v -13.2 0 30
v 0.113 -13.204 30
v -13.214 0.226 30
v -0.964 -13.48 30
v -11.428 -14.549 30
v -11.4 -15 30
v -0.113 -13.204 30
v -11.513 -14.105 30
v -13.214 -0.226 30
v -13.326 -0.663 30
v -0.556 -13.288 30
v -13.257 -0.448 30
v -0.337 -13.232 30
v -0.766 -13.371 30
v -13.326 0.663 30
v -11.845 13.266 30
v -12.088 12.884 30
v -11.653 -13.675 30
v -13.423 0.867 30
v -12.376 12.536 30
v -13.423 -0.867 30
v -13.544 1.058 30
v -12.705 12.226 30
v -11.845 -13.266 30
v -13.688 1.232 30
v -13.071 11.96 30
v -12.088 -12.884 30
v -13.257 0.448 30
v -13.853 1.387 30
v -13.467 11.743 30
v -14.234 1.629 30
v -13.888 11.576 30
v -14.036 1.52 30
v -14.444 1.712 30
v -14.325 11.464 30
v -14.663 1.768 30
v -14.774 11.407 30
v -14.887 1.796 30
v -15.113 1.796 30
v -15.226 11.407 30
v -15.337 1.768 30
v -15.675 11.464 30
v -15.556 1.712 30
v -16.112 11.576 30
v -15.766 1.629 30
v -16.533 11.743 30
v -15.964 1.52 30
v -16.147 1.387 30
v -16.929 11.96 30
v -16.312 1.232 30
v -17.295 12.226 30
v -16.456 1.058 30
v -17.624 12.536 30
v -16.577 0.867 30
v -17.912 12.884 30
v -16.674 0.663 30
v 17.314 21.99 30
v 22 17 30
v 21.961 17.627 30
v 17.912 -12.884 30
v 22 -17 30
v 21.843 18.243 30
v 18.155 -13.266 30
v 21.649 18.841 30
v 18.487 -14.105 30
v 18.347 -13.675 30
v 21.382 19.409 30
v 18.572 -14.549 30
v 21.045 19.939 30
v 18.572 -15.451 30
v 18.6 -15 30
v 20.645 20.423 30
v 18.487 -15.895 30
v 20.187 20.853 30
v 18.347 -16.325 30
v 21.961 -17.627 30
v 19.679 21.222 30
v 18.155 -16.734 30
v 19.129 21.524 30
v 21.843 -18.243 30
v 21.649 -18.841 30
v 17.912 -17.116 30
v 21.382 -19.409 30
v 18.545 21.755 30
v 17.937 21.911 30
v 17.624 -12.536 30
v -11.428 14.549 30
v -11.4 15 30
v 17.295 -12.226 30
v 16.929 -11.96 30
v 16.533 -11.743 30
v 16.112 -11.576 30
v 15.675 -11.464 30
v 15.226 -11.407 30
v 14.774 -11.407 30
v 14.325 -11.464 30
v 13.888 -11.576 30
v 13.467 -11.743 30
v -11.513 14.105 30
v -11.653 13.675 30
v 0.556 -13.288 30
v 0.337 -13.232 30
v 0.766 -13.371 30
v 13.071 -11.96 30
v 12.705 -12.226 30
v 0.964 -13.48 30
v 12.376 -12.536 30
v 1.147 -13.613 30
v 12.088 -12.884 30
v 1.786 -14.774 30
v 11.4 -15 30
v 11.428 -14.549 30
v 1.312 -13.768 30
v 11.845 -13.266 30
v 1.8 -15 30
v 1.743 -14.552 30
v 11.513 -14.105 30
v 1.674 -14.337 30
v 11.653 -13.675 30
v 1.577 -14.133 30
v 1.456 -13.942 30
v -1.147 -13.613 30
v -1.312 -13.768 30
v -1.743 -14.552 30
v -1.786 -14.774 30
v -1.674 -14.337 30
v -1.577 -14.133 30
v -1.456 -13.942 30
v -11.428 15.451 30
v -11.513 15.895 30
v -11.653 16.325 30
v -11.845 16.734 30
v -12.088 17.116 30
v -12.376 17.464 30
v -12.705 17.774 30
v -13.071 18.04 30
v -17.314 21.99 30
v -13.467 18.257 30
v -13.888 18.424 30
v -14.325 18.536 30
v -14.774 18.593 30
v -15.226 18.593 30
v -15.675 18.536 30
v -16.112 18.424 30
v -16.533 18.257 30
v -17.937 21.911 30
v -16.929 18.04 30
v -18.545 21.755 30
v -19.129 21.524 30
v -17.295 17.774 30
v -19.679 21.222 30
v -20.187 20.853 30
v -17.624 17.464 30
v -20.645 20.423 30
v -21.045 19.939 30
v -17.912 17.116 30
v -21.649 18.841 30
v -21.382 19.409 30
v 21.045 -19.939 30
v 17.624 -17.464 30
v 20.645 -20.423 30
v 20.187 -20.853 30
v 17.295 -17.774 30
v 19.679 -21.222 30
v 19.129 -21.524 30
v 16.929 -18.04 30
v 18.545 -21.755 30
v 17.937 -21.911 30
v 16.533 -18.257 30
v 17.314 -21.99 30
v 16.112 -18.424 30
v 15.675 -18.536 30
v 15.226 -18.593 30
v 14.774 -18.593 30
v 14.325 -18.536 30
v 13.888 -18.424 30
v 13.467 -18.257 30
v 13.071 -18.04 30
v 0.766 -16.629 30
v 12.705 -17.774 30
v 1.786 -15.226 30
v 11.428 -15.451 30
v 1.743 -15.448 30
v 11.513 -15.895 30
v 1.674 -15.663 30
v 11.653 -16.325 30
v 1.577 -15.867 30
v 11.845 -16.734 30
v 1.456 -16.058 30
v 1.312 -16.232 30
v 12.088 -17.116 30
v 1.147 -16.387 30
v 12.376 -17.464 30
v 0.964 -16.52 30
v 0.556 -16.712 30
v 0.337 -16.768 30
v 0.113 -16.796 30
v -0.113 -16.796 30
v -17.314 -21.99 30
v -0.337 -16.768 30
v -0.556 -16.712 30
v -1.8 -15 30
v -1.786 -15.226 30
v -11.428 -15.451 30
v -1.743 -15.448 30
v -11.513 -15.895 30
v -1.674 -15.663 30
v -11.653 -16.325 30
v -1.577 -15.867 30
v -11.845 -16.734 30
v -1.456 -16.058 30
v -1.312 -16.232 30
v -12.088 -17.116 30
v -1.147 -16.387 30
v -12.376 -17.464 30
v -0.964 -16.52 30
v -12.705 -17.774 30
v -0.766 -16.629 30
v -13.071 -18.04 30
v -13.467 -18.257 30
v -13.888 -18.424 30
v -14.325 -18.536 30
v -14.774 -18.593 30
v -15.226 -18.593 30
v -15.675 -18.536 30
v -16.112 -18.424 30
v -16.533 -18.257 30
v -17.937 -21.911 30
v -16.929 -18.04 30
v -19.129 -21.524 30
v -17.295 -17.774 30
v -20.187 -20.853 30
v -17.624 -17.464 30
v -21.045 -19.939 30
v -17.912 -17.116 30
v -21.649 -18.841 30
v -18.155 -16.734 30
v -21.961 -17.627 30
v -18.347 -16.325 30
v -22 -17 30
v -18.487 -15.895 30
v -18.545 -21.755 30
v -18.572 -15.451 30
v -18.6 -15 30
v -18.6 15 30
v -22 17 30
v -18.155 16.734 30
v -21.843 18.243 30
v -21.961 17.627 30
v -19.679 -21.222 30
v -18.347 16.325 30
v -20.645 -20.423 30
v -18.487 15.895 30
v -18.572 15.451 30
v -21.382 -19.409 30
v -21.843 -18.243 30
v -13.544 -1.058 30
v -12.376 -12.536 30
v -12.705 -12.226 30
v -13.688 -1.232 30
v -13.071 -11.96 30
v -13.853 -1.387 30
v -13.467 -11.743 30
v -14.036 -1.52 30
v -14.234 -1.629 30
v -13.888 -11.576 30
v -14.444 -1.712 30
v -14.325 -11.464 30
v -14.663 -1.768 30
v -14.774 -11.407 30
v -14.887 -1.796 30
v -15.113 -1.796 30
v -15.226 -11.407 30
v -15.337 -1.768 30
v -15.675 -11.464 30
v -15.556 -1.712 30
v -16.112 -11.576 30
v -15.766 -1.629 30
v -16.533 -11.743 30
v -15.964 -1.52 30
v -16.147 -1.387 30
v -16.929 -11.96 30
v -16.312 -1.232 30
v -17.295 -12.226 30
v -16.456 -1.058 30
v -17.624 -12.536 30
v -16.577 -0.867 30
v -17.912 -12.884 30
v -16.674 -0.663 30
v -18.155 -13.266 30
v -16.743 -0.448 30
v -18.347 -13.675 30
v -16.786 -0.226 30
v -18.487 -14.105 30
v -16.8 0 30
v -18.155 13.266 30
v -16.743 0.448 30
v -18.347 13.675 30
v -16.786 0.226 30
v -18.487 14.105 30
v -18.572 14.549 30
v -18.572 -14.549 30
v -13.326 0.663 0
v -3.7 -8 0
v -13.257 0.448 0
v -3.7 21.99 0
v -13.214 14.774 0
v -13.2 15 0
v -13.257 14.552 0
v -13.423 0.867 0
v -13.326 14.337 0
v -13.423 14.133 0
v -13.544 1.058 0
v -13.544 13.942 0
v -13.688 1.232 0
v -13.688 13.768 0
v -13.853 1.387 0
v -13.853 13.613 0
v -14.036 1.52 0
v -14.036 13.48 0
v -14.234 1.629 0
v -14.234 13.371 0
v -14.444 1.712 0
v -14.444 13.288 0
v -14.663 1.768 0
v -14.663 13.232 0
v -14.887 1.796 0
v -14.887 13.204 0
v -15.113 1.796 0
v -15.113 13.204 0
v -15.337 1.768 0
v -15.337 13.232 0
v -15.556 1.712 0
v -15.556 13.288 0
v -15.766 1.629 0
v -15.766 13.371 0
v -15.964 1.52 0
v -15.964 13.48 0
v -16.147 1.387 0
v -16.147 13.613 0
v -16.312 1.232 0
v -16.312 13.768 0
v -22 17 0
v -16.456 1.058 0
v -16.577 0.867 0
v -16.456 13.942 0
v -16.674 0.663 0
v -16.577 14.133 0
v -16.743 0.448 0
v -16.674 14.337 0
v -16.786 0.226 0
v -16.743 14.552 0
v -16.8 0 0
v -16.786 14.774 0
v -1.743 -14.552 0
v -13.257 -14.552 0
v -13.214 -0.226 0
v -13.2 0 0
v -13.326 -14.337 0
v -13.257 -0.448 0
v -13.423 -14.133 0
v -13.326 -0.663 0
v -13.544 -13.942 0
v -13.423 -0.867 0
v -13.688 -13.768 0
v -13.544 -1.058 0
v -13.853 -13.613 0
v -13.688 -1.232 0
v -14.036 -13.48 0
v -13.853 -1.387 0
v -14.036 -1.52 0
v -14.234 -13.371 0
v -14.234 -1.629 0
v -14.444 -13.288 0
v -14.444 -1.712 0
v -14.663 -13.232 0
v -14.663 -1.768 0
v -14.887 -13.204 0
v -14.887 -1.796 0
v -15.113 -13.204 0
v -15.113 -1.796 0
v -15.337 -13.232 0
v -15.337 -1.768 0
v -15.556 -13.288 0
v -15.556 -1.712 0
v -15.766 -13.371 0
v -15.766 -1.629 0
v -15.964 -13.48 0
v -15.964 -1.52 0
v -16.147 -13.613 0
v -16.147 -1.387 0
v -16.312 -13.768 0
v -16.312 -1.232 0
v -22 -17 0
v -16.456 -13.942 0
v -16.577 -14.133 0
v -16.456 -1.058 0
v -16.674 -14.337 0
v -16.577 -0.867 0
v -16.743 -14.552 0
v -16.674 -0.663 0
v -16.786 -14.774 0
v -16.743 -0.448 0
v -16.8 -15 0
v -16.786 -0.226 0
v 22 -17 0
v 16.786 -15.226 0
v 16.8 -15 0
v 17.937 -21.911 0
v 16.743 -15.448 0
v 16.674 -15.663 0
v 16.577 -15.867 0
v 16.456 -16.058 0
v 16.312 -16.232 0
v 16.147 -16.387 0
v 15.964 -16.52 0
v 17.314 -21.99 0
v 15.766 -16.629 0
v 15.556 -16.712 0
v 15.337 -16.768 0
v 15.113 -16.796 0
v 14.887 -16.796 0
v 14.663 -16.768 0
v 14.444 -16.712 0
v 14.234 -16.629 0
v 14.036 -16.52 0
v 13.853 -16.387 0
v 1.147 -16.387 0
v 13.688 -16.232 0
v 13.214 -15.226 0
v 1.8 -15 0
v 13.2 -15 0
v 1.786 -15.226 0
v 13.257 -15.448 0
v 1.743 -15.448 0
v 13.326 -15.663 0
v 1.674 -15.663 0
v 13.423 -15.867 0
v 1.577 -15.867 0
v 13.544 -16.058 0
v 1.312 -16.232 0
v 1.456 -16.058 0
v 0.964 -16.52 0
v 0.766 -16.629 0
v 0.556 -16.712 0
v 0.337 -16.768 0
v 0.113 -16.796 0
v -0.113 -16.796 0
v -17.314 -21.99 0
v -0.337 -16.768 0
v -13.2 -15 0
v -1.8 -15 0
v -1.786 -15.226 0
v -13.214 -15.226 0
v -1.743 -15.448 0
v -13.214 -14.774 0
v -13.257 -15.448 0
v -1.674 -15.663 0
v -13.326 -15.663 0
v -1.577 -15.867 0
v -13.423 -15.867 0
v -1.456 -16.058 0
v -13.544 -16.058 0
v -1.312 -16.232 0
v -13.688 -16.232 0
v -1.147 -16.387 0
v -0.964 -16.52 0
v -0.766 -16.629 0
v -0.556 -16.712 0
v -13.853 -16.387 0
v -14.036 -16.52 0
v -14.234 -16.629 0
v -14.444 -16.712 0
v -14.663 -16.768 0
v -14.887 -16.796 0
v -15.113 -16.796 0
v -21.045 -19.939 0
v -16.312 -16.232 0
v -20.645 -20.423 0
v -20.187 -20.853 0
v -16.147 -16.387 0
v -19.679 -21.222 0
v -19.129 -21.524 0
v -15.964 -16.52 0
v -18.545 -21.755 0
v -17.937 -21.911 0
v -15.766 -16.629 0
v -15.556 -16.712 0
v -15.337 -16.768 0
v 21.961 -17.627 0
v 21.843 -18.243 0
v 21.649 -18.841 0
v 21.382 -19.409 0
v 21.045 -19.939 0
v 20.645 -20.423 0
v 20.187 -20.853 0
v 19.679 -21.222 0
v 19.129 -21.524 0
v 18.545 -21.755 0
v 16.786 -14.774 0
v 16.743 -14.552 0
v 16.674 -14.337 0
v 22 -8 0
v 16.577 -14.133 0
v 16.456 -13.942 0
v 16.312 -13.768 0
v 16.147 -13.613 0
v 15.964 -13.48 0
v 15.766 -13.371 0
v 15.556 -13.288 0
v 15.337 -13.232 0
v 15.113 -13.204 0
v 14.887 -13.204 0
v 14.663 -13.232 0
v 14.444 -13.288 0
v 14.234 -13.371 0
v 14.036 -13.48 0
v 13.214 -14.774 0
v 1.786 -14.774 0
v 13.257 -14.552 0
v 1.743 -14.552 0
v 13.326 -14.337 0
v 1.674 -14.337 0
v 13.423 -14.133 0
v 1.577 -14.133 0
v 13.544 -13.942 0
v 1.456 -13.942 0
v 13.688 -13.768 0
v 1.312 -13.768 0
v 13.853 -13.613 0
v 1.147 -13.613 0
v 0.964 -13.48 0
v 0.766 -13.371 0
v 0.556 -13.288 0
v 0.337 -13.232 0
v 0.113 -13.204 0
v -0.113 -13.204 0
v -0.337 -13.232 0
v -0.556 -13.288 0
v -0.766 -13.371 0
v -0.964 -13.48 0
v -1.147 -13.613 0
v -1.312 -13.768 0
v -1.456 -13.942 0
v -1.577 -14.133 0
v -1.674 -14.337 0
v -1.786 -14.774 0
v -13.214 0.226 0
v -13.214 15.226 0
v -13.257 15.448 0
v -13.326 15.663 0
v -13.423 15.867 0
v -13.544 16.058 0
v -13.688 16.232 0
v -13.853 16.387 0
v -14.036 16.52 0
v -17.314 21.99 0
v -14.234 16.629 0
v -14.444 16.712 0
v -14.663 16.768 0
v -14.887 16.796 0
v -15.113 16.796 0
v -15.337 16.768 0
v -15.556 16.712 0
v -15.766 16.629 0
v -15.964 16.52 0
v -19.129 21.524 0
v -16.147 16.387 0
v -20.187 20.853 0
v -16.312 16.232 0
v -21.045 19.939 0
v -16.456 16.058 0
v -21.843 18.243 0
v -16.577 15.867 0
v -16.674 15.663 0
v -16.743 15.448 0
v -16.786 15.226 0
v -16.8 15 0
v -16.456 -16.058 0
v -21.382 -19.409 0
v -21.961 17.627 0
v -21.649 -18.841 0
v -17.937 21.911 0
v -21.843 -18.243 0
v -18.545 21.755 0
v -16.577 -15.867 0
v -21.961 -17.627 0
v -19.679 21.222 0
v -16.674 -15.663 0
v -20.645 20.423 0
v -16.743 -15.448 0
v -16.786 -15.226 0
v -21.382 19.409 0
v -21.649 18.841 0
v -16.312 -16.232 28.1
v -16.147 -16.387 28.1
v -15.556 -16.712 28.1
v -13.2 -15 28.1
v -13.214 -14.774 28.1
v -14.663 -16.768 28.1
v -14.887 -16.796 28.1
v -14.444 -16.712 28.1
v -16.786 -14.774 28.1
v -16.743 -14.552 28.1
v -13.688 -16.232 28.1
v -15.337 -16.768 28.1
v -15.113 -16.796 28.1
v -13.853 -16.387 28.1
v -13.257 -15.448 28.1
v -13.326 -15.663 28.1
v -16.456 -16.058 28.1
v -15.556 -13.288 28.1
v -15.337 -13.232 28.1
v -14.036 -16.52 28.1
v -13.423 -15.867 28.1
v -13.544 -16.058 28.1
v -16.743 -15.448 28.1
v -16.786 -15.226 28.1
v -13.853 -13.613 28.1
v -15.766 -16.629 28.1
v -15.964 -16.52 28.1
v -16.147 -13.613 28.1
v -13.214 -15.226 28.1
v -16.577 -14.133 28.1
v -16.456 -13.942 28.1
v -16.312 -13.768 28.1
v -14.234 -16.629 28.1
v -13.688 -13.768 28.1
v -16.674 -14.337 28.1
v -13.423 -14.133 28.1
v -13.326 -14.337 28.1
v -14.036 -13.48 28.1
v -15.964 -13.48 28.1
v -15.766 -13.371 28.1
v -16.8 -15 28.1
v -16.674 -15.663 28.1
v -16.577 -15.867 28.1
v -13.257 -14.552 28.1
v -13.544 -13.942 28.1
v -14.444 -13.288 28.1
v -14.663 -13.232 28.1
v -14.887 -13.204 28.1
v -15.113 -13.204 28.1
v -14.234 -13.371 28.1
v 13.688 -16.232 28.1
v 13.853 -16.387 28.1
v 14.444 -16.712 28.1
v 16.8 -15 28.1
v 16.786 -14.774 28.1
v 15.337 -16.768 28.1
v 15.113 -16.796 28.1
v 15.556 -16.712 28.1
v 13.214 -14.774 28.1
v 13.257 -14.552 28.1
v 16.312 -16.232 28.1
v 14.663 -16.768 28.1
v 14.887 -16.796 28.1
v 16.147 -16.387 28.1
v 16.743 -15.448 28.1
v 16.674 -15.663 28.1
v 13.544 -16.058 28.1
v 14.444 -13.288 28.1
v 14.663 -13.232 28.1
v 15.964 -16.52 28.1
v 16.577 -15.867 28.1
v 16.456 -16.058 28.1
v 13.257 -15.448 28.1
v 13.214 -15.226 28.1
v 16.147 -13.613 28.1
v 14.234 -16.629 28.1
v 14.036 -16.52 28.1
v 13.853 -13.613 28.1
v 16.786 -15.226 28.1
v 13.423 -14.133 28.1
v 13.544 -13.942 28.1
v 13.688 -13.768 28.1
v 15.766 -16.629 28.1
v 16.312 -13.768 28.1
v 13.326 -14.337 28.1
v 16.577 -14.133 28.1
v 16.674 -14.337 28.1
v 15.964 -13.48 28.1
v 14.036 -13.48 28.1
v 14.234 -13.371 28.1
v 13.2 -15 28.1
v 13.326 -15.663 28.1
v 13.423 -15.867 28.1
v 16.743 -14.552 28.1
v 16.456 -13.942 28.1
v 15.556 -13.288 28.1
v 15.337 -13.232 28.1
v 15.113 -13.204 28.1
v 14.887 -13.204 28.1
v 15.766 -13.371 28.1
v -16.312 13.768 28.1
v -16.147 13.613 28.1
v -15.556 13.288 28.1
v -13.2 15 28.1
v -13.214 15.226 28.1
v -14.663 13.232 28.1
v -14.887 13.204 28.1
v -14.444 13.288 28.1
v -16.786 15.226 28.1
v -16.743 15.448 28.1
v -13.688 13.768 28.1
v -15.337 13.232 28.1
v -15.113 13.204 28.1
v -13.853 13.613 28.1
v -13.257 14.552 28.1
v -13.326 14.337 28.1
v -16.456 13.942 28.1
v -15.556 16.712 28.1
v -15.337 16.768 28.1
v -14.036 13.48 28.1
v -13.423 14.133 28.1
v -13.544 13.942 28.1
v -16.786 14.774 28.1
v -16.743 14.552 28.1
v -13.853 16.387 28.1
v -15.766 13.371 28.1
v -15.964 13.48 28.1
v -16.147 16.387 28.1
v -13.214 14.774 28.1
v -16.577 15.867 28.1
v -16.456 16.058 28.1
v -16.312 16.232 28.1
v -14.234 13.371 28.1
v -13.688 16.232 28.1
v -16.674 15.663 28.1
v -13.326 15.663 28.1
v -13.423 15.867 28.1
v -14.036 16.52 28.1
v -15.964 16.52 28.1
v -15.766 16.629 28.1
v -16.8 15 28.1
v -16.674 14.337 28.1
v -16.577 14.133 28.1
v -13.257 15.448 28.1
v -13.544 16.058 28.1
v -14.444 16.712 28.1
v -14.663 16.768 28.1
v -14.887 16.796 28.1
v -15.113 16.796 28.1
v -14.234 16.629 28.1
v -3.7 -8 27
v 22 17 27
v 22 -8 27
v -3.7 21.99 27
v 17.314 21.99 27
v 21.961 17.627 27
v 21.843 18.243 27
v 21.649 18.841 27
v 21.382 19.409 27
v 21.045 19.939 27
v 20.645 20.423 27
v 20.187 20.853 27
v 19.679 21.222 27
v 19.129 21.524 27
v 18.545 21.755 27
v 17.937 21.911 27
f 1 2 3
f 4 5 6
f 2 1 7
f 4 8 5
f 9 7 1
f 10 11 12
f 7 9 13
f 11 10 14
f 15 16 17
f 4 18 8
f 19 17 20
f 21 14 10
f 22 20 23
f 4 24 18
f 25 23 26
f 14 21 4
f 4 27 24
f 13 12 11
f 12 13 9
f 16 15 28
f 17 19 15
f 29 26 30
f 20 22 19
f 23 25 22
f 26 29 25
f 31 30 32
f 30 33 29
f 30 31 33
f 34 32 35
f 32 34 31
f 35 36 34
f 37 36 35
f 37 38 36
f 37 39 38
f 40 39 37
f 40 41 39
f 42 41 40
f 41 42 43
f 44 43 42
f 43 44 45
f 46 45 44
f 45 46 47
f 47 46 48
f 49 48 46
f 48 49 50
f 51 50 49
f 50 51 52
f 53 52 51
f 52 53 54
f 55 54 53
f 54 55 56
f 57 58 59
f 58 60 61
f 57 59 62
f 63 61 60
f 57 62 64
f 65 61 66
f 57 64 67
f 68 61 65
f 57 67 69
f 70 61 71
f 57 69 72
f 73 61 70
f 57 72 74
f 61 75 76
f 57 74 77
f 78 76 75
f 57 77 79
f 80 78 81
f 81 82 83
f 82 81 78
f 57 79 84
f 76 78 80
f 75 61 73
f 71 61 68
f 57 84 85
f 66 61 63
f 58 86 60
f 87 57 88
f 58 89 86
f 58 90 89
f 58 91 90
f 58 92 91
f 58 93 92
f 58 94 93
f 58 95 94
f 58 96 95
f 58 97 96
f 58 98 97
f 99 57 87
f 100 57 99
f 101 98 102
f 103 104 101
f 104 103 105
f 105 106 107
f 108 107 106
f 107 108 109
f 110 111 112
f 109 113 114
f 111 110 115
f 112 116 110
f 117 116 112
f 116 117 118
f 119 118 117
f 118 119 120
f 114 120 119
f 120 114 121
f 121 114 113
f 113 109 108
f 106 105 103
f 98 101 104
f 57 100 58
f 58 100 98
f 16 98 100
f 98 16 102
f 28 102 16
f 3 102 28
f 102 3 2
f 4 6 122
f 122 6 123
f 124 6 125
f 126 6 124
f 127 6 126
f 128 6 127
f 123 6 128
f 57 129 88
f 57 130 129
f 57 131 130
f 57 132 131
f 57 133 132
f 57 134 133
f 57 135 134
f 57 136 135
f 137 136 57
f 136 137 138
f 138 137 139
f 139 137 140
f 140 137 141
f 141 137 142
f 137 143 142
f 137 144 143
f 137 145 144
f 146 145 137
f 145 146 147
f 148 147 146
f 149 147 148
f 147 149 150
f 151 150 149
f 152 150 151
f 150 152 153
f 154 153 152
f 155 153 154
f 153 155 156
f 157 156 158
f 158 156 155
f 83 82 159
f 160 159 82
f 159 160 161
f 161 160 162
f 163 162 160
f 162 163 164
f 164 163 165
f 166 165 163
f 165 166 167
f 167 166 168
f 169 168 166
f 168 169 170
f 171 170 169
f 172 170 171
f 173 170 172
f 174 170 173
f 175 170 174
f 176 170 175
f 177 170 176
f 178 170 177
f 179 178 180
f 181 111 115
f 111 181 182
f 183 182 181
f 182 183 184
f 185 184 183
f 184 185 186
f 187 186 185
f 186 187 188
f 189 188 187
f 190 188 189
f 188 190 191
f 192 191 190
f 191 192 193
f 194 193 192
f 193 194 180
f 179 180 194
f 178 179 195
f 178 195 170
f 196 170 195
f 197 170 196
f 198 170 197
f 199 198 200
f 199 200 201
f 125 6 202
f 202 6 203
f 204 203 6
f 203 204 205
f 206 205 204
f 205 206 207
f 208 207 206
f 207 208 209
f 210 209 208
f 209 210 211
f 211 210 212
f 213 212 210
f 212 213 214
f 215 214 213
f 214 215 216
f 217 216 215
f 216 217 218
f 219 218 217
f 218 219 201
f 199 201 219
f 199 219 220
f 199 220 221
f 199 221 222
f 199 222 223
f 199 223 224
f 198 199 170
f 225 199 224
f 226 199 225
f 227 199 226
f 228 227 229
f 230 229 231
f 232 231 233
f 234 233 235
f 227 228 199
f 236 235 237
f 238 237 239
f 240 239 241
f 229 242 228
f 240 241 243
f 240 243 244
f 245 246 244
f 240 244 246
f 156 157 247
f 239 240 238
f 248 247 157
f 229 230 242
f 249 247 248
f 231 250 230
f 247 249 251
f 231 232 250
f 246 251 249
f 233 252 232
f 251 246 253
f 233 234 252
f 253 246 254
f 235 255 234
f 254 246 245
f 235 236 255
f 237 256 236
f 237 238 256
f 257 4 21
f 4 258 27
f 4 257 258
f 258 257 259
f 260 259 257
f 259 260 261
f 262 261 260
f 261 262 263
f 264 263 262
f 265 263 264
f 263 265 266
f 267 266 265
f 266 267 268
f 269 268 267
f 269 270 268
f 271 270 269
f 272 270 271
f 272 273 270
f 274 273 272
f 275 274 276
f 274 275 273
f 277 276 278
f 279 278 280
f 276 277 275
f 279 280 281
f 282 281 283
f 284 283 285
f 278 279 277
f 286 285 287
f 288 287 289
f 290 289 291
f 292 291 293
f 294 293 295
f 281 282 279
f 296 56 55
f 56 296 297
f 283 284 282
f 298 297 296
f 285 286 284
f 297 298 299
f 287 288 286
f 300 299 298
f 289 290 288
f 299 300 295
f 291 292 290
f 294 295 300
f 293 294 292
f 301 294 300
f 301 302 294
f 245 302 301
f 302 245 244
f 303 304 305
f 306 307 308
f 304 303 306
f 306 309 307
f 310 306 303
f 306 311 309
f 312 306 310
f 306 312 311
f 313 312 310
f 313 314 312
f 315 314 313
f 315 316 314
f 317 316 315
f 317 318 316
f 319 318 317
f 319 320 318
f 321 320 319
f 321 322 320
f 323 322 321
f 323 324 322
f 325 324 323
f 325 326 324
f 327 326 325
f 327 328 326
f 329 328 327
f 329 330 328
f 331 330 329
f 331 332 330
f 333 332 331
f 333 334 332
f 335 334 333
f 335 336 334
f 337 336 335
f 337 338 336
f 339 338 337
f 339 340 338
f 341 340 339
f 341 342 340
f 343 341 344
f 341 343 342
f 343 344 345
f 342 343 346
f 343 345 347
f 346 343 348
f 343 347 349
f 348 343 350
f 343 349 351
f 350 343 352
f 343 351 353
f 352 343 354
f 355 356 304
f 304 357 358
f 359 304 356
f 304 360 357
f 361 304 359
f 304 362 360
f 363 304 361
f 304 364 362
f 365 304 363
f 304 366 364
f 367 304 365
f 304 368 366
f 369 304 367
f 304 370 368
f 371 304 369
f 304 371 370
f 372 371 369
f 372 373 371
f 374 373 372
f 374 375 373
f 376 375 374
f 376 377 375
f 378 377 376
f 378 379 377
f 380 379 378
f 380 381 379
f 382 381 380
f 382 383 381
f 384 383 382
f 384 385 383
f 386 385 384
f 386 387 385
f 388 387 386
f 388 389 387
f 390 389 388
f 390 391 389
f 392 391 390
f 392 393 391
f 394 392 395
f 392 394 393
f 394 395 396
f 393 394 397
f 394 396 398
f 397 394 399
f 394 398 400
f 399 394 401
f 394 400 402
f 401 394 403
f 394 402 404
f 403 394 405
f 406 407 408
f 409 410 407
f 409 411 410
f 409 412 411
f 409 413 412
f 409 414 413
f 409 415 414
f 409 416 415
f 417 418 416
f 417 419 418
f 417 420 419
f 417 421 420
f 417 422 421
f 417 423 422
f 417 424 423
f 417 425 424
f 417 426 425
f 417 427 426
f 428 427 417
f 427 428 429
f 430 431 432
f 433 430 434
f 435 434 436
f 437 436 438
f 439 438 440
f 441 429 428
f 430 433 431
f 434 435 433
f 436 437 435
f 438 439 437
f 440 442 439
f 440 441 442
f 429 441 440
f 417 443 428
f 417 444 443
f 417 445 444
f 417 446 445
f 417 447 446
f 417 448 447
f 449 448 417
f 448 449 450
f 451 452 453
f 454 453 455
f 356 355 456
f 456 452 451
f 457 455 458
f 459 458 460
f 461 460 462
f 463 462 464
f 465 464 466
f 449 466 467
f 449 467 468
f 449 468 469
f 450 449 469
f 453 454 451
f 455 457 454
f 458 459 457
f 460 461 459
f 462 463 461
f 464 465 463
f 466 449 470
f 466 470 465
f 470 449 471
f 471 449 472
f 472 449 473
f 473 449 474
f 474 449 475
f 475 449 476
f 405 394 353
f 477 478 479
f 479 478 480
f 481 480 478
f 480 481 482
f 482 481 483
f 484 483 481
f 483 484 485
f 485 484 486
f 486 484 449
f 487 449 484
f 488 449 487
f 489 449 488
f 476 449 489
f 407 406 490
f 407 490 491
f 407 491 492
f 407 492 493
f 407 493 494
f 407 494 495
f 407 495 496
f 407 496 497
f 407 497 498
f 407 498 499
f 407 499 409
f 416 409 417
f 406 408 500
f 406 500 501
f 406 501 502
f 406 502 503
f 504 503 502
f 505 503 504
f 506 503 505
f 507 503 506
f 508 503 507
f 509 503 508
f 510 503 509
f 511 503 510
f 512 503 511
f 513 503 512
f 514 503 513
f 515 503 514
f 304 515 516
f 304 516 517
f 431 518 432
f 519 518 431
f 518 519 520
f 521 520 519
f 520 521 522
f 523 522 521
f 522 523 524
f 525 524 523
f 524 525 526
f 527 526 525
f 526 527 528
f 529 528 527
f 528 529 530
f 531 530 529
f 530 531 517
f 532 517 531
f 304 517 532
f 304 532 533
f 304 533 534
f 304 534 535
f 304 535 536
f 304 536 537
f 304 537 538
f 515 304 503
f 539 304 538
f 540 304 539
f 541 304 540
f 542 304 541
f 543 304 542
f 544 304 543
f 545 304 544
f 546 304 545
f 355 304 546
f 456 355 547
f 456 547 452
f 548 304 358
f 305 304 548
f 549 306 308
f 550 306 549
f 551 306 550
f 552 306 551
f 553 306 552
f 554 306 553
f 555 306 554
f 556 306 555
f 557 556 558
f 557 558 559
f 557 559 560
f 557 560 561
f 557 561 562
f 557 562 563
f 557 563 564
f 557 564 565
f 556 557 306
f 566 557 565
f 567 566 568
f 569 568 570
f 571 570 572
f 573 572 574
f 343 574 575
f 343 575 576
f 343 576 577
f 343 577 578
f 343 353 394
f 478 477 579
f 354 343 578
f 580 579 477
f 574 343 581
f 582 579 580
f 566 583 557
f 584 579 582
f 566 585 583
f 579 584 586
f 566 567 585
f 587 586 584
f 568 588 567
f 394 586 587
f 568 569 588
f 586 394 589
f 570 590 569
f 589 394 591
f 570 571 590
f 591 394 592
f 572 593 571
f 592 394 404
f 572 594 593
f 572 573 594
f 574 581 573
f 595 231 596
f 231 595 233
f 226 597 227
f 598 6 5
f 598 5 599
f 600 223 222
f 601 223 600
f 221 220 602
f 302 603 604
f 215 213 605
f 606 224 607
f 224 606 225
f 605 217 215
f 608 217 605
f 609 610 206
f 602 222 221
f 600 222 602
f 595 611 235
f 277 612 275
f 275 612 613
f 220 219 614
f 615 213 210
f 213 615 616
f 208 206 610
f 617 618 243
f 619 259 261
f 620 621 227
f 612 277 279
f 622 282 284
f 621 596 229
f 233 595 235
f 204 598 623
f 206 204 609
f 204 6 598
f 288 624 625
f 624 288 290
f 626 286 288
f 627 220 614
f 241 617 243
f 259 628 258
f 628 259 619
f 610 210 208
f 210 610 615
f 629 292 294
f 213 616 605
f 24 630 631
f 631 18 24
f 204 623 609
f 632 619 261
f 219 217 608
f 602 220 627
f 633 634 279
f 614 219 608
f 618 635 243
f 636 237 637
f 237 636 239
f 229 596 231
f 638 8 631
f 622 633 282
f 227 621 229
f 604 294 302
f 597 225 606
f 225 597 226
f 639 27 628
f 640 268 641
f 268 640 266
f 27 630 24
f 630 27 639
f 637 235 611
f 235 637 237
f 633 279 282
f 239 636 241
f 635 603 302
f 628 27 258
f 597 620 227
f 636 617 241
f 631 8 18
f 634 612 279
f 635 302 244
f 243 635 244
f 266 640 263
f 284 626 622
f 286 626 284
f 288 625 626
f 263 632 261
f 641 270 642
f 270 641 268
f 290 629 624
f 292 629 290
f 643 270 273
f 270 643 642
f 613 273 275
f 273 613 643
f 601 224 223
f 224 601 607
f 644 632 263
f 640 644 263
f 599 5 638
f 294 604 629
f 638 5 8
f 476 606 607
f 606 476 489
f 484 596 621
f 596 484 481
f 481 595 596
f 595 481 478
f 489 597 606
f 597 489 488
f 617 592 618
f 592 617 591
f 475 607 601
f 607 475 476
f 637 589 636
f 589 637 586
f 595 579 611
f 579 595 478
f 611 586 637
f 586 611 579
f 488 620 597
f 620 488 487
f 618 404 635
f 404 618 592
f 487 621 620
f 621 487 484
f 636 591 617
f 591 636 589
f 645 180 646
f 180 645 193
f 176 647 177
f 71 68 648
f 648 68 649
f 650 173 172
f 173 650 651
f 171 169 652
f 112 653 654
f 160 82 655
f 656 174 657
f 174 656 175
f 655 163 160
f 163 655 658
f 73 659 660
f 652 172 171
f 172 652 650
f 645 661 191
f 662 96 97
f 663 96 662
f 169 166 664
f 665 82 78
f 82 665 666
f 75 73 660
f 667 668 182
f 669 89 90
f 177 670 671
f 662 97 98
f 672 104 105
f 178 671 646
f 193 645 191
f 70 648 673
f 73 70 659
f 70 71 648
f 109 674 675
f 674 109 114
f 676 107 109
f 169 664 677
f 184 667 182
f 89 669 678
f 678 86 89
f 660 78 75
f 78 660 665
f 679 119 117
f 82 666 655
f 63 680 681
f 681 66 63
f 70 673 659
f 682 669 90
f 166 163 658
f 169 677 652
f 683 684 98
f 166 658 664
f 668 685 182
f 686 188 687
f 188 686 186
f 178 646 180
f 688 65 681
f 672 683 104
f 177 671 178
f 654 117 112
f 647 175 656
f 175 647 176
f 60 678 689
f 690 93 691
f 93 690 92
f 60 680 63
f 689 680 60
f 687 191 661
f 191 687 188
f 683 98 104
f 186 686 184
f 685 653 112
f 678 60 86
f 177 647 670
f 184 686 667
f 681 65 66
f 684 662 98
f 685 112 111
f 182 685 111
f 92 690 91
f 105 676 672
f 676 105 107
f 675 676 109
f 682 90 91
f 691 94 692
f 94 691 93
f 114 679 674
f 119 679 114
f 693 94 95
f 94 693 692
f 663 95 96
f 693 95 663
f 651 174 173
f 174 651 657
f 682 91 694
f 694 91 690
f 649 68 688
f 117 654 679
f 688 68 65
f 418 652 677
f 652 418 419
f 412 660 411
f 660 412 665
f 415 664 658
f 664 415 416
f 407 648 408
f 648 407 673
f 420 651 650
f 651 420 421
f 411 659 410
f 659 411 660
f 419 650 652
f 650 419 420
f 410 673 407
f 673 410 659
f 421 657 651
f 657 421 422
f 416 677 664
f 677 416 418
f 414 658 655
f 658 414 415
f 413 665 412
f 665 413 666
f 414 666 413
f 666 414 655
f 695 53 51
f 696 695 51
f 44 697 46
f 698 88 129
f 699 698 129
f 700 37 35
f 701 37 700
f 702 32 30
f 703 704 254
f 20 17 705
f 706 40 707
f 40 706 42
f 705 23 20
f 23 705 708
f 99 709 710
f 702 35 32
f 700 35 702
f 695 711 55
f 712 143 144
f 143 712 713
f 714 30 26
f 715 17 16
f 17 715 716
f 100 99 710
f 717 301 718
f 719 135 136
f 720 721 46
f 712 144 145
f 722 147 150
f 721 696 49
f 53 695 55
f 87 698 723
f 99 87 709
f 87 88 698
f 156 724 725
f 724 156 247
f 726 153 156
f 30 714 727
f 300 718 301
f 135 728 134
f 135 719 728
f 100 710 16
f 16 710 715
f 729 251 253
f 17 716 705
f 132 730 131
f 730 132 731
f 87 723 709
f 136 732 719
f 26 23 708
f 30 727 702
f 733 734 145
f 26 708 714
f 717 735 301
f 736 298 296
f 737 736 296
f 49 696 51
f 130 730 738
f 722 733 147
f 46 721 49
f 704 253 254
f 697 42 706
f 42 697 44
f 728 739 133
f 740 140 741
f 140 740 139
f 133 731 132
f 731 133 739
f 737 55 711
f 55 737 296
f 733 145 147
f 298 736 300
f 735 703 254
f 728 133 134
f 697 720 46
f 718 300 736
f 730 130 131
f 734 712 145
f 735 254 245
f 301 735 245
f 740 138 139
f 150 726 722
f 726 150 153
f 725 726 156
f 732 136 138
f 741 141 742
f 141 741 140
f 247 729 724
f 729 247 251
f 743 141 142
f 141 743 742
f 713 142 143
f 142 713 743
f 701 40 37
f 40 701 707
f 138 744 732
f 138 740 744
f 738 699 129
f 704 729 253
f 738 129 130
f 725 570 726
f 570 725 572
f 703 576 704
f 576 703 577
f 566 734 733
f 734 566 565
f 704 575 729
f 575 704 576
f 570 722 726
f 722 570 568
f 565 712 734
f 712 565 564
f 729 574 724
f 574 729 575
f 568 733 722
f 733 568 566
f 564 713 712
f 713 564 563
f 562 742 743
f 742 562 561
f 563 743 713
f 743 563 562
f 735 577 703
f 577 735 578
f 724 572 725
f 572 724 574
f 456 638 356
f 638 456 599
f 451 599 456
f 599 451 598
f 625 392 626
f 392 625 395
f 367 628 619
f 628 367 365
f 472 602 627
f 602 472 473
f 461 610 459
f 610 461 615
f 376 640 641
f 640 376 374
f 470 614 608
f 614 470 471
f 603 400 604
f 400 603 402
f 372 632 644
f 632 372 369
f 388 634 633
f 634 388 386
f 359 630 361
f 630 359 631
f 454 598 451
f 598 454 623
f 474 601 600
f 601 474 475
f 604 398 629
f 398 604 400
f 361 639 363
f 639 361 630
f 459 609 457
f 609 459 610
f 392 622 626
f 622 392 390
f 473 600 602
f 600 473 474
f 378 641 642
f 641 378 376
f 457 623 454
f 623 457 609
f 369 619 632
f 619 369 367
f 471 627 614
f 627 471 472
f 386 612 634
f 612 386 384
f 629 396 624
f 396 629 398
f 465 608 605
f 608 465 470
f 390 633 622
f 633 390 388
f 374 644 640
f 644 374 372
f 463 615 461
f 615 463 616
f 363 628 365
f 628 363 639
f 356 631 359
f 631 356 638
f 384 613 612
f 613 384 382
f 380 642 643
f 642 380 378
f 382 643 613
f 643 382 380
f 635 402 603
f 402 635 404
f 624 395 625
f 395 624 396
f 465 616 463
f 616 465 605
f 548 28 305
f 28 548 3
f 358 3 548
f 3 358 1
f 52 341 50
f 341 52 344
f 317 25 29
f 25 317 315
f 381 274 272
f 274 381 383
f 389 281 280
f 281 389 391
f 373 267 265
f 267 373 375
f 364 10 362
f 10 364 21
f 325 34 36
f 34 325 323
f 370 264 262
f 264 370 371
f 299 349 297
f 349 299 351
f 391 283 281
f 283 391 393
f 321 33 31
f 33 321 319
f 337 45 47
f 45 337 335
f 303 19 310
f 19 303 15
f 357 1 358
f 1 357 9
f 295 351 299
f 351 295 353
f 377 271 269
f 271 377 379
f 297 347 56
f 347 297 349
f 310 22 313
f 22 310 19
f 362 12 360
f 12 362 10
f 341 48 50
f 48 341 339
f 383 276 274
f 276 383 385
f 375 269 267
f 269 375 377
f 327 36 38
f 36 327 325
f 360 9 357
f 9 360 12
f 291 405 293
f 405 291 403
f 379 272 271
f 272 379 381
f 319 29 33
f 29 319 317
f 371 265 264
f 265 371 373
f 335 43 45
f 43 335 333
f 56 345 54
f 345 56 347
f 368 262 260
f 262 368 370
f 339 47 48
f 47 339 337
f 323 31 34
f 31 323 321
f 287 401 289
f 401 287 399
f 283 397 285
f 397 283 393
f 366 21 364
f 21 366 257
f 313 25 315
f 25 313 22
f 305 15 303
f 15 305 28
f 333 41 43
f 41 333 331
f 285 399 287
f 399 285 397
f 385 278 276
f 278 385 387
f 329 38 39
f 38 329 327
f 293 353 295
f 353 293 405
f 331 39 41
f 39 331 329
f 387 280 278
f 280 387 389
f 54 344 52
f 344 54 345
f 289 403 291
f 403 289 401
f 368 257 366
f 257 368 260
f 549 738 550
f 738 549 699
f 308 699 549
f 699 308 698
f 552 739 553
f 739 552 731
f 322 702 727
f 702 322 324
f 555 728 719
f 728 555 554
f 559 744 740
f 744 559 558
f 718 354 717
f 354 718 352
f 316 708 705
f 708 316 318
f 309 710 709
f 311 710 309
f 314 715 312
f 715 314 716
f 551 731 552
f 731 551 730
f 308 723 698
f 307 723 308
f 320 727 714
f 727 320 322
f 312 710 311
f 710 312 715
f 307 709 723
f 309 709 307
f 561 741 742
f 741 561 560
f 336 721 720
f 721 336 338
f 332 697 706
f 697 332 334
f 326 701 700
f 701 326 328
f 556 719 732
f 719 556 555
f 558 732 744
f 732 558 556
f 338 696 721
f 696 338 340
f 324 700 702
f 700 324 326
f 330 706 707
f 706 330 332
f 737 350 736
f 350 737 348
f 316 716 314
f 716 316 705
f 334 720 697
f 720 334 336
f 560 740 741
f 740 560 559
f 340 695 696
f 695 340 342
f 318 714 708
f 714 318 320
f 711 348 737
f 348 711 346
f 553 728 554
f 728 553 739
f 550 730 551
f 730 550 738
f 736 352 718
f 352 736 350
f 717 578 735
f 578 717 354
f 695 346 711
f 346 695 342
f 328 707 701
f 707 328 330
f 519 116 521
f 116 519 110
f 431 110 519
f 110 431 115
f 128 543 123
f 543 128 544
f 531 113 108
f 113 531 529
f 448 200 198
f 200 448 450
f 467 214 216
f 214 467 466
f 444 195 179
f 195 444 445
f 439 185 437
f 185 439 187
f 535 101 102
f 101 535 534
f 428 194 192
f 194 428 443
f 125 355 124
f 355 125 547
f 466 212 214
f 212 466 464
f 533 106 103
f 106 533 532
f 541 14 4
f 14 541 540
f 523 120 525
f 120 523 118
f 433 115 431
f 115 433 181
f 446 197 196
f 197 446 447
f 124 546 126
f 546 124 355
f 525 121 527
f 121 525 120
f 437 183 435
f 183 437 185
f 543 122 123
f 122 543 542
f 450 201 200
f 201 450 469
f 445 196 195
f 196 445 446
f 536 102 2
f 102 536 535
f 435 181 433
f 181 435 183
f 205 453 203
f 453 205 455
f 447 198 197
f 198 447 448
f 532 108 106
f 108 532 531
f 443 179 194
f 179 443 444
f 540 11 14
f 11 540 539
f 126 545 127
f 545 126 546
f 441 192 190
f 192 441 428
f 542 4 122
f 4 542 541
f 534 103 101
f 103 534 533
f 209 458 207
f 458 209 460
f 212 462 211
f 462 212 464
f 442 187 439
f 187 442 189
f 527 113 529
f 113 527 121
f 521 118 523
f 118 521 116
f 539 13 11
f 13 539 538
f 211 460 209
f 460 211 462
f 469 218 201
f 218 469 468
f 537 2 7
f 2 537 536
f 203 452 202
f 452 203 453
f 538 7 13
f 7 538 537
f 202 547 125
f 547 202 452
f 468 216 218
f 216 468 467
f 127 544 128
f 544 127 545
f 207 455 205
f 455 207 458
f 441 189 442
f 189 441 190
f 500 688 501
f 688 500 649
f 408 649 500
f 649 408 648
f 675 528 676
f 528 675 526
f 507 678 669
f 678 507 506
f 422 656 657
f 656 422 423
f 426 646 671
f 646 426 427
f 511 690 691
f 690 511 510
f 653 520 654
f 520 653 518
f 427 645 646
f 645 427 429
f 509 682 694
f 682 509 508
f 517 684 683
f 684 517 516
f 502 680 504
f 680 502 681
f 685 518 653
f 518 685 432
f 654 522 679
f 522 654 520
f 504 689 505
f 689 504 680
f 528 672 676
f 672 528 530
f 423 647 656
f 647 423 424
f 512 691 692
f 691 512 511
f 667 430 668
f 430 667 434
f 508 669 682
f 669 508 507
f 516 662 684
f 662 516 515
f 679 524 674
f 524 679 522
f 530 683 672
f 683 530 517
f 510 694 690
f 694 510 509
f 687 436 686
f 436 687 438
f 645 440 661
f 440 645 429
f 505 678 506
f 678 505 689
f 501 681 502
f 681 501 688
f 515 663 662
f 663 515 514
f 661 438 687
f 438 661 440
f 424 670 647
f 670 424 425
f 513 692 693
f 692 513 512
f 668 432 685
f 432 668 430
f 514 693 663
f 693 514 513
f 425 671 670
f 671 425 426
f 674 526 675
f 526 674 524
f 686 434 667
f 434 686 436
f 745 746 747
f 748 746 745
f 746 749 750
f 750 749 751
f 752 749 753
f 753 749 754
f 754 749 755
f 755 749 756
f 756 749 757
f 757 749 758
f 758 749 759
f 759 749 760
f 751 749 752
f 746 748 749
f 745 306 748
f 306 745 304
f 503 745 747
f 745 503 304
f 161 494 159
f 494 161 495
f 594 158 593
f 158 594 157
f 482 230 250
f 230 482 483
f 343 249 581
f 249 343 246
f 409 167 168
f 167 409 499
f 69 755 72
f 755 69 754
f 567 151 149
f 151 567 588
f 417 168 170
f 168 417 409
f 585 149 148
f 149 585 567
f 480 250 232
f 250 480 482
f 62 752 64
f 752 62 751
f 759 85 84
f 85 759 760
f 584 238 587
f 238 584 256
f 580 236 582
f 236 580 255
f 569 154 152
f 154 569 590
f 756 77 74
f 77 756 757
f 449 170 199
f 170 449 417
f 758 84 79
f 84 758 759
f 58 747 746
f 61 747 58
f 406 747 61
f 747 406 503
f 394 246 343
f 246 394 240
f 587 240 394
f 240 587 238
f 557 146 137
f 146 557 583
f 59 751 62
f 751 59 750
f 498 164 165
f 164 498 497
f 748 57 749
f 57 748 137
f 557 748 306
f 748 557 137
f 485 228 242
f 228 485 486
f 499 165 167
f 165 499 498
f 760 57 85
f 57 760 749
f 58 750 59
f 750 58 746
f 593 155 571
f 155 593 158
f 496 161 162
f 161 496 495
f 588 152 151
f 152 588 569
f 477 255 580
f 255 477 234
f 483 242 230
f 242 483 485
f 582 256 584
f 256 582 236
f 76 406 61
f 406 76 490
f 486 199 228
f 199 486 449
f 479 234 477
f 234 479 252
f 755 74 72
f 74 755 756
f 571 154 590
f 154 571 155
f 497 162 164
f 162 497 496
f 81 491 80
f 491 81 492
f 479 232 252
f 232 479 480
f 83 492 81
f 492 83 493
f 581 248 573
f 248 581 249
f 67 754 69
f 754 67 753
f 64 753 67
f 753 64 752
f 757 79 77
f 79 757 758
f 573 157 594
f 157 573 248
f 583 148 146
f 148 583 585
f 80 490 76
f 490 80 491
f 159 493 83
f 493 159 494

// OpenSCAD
$fn = 50;


difference() {
	union() {
		hull() {
			translate(v = [-17.0000000000, 17.0000000000, 0]) {
				cylinder(h = 30, r = 5);
			}
			translate(v = [17.0000000000, 17.0000000000, 0]) {
				cylinder(h = 30, r = 5);
			}
			translate(v = [-17.0000000000, -17.0000000000, 0]) {
				cylinder(h = 30, r = 5);
			}
			translate(v = [17.0000000000, -17.0000000000, 0]) {
				cylinder(h = 30, r = 5);
			}
		}
	}
	union() {
		translate(v = [-15.0000000000, -15.0000000000, 30]) {
			rotate(a = [0, 0, 0]) {
				difference() {
					union() {
						#translate(v = [0, 0, -30.0000000000]) {
							cylinder(h = 30, r = 1.5000000000);
						}
						#translate(v = [0, 0, -1.9000000000]) {
							cylinder(h = 1.9000000000, r1 = 1.8000000000, r2 = 3.6000000000);
						}
						#translate(v = [0, 0, -30.0000000000]) {
							cylinder(h = 30, r = 1.8000000000);
						}
						#translate(v = [0, 0, -30.0000000000]) {
							cylinder(h = 30, r = 1.5000000000);
						}
					}
					union();
				}
			}
		}
		translate(v = [15.0000000000, -15.0000000000, 30]) {
			rotate(a = [0, 0, 0]) {
				difference() {
					union() {
						#translate(v = [0, 0, -30.0000000000]) {
							cylinder(h = 30, r = 1.5000000000);
						}
						#translate(v = [0, 0, -1.9000000000]) {
							cylinder(h = 1.9000000000, r1 = 1.8000000000, r2 = 3.6000000000);
						}
						#translate(v = [0, 0, -30.0000000000]) {
							cylinder(h = 30, r = 1.8000000000);
						}
						#translate(v = [0, 0, -30.0000000000]) {
							cylinder(h = 30, r = 1.5000000000);
						}
					}
					union();
				}
			}
		}
		translate(v = [-15.0000000000, 15.0000000000, 30]) {
			rotate(a = [0, 0, 0]) {
				difference() {
					union() {
						#translate(v = [0, 0, -30.0000000000]) {
							cylinder(h = 30, r = 1.5000000000);
						}
						#translate(v = [0, 0, -1.9000000000]) {
							cylinder(h = 1.9000000000, r1 = 1.8000000000, r2 = 3.6000000000);
						}
						#translate(v = [0, 0, -30.0000000000]) {
							cylinder(h = 30, r = 1.8000000000);
						}
						#translate(v = [0, 0, -30.0000000000]) {
							cylinder(h = 30, r = 1.5000000000);
						}
					}
					union();
				}
			}
		}
		translate(v = [-15.0000000000, -15.0000000000, 0]) {
			cylinder(h = 30, r = 1.8000000000);
		}
		translate(v = [-15.0000000000, 0.0000000000, 0]) {
			cylinder(h = 30, r = 1.8000000000);
		}
		translate(v = [-15.0000000000, 15.0000000000, 0]) {
			cylinder(h = 30, r = 1.8000000000);
		}
		translate(v = [-15.0000000000, -15.0000000000, 0]) {
			cylinder(h = 30, r = 1.8000000000);
		}
		translate(v = [0.0000000000, -15.0000000000, 0]) {
			cylinder(h = 30, r = 1.8000000000);
		}
		translate(v = [15.0000000000, -15.0000000000, 0]) {
			cylinder(h = 30, r = 1.8000000000);
		}
		#translate(v = [-3.7000000000, -8.0000000000, 0]) {
			cube(size = [156.4000000000, 105.6000000000, 27]);
		}
	}
}
